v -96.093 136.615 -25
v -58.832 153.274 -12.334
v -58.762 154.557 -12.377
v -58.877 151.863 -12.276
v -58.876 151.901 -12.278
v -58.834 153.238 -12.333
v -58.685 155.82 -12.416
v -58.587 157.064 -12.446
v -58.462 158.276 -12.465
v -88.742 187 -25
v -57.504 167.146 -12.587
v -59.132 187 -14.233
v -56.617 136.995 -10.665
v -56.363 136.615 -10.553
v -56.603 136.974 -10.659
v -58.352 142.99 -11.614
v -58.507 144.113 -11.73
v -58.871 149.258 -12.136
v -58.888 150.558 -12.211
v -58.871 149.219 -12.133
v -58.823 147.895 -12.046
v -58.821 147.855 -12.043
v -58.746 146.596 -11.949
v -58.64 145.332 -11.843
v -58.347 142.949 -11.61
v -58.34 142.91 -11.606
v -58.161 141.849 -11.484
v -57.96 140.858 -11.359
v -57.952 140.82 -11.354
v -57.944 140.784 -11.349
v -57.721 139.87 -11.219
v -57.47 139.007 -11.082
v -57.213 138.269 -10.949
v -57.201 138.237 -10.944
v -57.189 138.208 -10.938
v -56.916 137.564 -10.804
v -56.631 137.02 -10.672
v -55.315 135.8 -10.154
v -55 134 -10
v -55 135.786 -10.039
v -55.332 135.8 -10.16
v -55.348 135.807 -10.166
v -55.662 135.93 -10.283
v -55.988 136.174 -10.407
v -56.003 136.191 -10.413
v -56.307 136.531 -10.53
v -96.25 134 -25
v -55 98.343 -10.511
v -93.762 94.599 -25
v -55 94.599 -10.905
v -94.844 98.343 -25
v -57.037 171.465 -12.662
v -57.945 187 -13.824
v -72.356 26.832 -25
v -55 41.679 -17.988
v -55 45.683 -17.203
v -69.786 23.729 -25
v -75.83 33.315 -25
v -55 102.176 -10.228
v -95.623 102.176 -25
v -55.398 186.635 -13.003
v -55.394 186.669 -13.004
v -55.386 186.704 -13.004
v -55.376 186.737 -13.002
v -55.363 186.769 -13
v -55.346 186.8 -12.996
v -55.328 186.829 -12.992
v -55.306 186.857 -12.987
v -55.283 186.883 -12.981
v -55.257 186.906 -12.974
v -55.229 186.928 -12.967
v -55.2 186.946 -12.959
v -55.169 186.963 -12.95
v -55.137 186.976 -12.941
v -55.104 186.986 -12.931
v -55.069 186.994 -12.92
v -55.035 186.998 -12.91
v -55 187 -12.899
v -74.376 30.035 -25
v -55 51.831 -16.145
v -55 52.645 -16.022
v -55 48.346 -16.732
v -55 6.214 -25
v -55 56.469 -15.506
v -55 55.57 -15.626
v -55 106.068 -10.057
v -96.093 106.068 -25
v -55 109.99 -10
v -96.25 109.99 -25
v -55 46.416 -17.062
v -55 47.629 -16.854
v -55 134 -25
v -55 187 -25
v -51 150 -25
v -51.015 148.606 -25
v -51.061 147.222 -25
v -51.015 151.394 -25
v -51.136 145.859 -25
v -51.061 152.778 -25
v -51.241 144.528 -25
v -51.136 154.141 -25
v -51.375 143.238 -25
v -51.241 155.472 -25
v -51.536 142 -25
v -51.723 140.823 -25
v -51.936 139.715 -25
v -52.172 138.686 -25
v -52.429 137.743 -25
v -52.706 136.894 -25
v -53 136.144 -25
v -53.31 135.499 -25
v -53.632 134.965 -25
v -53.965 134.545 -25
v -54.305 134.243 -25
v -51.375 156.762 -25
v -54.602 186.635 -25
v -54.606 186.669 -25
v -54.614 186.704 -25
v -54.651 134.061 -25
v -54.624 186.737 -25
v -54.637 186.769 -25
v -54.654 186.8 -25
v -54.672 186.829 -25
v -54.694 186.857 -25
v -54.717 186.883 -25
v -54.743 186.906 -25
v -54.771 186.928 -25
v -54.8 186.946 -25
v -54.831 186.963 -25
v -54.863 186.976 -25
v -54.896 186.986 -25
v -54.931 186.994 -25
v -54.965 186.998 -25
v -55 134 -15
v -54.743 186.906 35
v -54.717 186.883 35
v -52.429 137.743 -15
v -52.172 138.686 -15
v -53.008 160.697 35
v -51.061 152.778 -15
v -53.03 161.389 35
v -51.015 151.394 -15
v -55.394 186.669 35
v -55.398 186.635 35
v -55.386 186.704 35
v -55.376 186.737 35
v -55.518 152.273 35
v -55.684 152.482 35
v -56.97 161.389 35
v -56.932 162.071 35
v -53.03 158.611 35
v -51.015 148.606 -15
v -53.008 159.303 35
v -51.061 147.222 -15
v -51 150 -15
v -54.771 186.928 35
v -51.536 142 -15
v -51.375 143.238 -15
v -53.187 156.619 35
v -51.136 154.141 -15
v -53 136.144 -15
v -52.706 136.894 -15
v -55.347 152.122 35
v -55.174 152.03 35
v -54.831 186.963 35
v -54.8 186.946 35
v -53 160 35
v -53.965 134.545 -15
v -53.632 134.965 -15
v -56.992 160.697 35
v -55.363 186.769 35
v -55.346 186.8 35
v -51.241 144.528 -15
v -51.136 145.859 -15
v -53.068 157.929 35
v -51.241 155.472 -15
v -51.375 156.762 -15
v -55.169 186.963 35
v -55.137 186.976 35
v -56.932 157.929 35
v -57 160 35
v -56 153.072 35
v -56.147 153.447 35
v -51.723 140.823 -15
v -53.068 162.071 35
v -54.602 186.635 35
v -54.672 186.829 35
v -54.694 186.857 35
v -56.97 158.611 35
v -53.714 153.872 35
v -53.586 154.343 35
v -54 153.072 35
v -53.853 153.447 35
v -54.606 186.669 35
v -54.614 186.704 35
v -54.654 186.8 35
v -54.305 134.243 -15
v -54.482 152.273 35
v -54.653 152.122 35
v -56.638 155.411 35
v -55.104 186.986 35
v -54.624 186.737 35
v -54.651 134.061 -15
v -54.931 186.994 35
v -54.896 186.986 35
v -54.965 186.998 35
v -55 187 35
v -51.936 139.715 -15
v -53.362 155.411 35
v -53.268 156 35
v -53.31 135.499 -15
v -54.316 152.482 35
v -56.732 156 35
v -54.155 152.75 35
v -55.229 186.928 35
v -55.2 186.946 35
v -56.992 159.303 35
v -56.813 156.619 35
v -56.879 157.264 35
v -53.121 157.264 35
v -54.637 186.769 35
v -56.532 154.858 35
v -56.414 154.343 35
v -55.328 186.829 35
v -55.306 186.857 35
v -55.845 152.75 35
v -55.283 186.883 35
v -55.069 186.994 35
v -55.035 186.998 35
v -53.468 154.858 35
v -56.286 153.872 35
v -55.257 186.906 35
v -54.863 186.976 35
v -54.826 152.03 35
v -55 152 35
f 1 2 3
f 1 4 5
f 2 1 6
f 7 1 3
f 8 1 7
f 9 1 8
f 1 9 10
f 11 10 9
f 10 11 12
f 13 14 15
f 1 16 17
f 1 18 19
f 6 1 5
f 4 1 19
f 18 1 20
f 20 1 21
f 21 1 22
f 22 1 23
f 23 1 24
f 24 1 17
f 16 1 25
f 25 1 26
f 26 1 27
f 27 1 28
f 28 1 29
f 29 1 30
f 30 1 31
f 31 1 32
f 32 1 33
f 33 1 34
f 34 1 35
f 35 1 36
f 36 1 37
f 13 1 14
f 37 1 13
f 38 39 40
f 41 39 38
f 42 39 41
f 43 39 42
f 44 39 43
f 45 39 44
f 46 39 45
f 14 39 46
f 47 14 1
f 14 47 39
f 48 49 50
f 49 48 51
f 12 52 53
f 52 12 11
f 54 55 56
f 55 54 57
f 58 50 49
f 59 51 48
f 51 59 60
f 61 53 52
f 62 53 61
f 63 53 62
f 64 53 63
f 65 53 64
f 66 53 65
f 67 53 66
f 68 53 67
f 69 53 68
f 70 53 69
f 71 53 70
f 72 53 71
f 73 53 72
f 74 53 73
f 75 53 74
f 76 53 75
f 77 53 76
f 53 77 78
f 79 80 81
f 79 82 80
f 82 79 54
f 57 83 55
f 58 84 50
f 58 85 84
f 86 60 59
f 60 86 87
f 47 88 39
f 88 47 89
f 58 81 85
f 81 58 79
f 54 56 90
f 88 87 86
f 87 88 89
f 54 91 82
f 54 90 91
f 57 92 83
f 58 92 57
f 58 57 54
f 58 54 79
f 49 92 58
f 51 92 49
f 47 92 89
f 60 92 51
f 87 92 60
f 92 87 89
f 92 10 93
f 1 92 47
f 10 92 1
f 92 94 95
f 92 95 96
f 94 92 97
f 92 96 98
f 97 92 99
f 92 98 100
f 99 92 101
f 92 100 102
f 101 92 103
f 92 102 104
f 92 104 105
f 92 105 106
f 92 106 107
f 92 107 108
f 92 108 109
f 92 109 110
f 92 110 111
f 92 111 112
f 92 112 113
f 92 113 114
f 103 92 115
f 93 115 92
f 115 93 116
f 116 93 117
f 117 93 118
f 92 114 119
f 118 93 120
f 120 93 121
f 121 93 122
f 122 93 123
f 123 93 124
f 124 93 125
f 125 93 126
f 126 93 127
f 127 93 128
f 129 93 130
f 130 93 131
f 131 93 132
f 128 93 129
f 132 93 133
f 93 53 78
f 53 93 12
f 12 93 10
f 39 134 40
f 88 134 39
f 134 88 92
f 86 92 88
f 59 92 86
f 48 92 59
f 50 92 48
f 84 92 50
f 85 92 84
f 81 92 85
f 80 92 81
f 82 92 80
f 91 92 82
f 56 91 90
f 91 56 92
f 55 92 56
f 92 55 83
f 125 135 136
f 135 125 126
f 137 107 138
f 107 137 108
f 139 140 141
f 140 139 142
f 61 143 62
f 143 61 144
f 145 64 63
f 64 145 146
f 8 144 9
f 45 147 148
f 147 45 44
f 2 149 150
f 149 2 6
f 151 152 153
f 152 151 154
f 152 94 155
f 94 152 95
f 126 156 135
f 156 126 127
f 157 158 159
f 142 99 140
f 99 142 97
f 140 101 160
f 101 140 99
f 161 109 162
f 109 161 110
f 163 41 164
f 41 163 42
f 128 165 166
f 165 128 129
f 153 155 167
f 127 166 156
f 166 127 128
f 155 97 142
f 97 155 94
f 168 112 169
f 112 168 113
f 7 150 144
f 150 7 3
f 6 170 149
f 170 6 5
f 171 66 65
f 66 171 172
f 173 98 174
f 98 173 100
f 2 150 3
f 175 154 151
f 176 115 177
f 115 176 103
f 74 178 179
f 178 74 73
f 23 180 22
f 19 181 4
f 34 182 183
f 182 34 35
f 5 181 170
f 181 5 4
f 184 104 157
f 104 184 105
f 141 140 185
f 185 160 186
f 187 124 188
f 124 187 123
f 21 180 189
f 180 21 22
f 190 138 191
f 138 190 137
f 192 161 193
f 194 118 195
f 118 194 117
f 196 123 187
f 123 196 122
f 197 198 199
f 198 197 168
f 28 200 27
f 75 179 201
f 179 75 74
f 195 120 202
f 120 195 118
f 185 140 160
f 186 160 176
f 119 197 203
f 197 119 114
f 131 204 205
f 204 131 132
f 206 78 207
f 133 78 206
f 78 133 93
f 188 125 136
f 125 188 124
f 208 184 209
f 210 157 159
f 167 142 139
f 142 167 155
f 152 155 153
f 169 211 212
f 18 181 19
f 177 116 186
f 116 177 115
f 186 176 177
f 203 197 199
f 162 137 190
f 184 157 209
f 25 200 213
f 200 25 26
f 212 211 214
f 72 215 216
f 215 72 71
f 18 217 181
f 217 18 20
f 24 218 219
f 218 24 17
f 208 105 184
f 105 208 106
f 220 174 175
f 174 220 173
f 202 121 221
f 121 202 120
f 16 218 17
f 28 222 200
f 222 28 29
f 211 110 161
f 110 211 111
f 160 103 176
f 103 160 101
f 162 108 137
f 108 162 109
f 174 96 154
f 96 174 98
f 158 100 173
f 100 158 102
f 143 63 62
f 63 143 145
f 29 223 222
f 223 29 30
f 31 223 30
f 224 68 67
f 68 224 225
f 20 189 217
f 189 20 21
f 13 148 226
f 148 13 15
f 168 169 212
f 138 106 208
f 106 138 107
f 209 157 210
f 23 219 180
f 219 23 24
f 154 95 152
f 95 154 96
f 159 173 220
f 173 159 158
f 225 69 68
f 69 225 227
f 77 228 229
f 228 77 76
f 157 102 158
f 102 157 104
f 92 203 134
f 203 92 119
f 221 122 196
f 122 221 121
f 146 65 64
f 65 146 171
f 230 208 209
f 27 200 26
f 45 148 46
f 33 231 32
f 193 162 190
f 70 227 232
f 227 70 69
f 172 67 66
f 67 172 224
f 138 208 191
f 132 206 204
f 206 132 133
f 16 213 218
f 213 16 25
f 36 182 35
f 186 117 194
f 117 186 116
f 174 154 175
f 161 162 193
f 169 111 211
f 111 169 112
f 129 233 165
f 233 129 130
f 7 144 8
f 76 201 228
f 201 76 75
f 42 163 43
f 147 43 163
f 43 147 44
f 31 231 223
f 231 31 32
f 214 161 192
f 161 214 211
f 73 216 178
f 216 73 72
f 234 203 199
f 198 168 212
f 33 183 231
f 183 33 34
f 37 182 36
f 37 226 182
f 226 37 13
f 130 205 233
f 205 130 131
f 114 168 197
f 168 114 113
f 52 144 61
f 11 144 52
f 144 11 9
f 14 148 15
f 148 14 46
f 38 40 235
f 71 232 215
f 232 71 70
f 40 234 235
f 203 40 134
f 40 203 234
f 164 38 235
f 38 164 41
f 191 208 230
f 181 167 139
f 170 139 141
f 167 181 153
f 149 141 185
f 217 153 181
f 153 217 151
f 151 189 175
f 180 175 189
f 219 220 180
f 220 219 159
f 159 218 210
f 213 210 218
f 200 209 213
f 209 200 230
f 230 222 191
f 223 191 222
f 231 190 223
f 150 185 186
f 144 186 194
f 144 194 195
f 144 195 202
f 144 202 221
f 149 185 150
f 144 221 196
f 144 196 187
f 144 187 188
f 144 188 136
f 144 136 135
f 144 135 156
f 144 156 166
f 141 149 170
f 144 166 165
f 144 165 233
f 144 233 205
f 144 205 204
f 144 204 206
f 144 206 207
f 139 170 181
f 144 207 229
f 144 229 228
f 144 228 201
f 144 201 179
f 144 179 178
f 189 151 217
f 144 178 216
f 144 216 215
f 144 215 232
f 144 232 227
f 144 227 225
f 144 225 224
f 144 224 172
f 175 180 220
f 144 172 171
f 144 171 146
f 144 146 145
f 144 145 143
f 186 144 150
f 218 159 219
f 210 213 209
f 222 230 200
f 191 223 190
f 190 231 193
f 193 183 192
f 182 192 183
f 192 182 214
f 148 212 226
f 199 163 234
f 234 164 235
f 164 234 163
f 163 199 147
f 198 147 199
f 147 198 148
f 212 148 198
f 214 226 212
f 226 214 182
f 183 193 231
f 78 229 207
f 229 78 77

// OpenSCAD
// SPDX-License-Identifier: CC-BY-SA-4.0
//
//Fairings to fair from the mid intake to the nozzle to the underside of the board
//
//Copyright (C) 2018 Peter Bennett <thelargeostrich@gmail.com>
//
//This design is licensed under a Creative Commons Attribution-ShareAlike
//4.0 International license.
//
//You are free to:
//  Share — copy and redistribute the material in any medium or format
//  Adapt — remix, transform, and build upon the material
//          for any purpose, even commercially.
//
//Under the following terms:
//
//  Attribution — You must give appropriate credit, provide a link to
//                the license, and indicate if changes were made. You
//                may do so in any reasonable manner, but not in any
//                way that suggests the licensor endorses you or your use.
//  ShareAlike  — If you remix, transform, or build upon the material,
//                you must distribute your contributions under the same
//                license as the original.
//  No additional restrictions — You may not apply legal terms or
//                technological measures that legally restrict others
//                from doing anything the license permits.

$fn=72;
LENGTH=220;
module fairing(){
    hull(){
        translate([55,150,20])
            scale([1,4,1])
                cylinder(r=4, h=10, center=true);
        translate([55,160,-30])
            scale([1,4,1])
                cylinder(r=2, h=10, center=true);
        translate([55,186.6,-5])
            scale([1,1,1])
                cylinder(r=0.4, h=60, center=true);
    };
    difference(){
        intersection(){
            hull(){
                translate([0,40,27.5])
                    scale([1.4,0.7,1])
                        cylinder(r=55,h=5, center=true);
                translate([0,210,27.5])
                    scale([1.4,4.6,1])
                        cylinder(r=55,h=5, center=true);
                translate([0,LENGTH/2-0.01,25])
                    rotate([0,90,0])
                        scale([1,3,1])
                            cylinder(r=15,h=110, center=true);
                translate([0,LENGTH/2+24,25])
                    rotate([0,90,0])
                        scale([1,2,1])
                            cylinder(r=15,h=110, center=true);
                translate([0,LENGTH/2-0.01,45])
                    rotate([0,90,0])
                        scale([1,3,1])
                            cylinder(r=15,h=220, center=true);
                translate([0,LENGTH/2+24,45])
                    rotate([0,90,0])
                        scale([1,2,1])
                            cylinder(r=15,h=220, center=true);
                difference(){
                    hull(){
                        translate([20,110,20])
                            rotate([0,0,0])
                                scale([1,3,1])
                                    sphere(r=20, center=true);
                        translate([0,90,20])
                            rotate([0,0,0])
                                scale([1,3,1])
                                    sphere(r=20, center=true);
                        translate([20,134,20])
                            rotate([0,0,0])
                                scale([1,2,1])
                                    sphere(r=20, center=true);
                        translate([-20,134,20])
                            rotate([0,0,0])
                                scale([1,2,1])
                                    sphere(r=20, center=true);
                        translate([-20,110,20])
                            rotate([0,0,0])
                                scale([1,3,1])
                                    sphere(r=20, center=true);
                    };
                    translate([0,0,100])
                        cube([200,400,160],center=true);
                };
            };
            translate([0,0,12.5])
                cube([210,2*187,25],center=true);
        };
        translate([-55,0,0])
            cube([220,600,500],center=true);
    };
}
//scale by -1 to flip this for opposite side
//scale([-1,1,1])
    rotate([0,180,0])
        fairing();
